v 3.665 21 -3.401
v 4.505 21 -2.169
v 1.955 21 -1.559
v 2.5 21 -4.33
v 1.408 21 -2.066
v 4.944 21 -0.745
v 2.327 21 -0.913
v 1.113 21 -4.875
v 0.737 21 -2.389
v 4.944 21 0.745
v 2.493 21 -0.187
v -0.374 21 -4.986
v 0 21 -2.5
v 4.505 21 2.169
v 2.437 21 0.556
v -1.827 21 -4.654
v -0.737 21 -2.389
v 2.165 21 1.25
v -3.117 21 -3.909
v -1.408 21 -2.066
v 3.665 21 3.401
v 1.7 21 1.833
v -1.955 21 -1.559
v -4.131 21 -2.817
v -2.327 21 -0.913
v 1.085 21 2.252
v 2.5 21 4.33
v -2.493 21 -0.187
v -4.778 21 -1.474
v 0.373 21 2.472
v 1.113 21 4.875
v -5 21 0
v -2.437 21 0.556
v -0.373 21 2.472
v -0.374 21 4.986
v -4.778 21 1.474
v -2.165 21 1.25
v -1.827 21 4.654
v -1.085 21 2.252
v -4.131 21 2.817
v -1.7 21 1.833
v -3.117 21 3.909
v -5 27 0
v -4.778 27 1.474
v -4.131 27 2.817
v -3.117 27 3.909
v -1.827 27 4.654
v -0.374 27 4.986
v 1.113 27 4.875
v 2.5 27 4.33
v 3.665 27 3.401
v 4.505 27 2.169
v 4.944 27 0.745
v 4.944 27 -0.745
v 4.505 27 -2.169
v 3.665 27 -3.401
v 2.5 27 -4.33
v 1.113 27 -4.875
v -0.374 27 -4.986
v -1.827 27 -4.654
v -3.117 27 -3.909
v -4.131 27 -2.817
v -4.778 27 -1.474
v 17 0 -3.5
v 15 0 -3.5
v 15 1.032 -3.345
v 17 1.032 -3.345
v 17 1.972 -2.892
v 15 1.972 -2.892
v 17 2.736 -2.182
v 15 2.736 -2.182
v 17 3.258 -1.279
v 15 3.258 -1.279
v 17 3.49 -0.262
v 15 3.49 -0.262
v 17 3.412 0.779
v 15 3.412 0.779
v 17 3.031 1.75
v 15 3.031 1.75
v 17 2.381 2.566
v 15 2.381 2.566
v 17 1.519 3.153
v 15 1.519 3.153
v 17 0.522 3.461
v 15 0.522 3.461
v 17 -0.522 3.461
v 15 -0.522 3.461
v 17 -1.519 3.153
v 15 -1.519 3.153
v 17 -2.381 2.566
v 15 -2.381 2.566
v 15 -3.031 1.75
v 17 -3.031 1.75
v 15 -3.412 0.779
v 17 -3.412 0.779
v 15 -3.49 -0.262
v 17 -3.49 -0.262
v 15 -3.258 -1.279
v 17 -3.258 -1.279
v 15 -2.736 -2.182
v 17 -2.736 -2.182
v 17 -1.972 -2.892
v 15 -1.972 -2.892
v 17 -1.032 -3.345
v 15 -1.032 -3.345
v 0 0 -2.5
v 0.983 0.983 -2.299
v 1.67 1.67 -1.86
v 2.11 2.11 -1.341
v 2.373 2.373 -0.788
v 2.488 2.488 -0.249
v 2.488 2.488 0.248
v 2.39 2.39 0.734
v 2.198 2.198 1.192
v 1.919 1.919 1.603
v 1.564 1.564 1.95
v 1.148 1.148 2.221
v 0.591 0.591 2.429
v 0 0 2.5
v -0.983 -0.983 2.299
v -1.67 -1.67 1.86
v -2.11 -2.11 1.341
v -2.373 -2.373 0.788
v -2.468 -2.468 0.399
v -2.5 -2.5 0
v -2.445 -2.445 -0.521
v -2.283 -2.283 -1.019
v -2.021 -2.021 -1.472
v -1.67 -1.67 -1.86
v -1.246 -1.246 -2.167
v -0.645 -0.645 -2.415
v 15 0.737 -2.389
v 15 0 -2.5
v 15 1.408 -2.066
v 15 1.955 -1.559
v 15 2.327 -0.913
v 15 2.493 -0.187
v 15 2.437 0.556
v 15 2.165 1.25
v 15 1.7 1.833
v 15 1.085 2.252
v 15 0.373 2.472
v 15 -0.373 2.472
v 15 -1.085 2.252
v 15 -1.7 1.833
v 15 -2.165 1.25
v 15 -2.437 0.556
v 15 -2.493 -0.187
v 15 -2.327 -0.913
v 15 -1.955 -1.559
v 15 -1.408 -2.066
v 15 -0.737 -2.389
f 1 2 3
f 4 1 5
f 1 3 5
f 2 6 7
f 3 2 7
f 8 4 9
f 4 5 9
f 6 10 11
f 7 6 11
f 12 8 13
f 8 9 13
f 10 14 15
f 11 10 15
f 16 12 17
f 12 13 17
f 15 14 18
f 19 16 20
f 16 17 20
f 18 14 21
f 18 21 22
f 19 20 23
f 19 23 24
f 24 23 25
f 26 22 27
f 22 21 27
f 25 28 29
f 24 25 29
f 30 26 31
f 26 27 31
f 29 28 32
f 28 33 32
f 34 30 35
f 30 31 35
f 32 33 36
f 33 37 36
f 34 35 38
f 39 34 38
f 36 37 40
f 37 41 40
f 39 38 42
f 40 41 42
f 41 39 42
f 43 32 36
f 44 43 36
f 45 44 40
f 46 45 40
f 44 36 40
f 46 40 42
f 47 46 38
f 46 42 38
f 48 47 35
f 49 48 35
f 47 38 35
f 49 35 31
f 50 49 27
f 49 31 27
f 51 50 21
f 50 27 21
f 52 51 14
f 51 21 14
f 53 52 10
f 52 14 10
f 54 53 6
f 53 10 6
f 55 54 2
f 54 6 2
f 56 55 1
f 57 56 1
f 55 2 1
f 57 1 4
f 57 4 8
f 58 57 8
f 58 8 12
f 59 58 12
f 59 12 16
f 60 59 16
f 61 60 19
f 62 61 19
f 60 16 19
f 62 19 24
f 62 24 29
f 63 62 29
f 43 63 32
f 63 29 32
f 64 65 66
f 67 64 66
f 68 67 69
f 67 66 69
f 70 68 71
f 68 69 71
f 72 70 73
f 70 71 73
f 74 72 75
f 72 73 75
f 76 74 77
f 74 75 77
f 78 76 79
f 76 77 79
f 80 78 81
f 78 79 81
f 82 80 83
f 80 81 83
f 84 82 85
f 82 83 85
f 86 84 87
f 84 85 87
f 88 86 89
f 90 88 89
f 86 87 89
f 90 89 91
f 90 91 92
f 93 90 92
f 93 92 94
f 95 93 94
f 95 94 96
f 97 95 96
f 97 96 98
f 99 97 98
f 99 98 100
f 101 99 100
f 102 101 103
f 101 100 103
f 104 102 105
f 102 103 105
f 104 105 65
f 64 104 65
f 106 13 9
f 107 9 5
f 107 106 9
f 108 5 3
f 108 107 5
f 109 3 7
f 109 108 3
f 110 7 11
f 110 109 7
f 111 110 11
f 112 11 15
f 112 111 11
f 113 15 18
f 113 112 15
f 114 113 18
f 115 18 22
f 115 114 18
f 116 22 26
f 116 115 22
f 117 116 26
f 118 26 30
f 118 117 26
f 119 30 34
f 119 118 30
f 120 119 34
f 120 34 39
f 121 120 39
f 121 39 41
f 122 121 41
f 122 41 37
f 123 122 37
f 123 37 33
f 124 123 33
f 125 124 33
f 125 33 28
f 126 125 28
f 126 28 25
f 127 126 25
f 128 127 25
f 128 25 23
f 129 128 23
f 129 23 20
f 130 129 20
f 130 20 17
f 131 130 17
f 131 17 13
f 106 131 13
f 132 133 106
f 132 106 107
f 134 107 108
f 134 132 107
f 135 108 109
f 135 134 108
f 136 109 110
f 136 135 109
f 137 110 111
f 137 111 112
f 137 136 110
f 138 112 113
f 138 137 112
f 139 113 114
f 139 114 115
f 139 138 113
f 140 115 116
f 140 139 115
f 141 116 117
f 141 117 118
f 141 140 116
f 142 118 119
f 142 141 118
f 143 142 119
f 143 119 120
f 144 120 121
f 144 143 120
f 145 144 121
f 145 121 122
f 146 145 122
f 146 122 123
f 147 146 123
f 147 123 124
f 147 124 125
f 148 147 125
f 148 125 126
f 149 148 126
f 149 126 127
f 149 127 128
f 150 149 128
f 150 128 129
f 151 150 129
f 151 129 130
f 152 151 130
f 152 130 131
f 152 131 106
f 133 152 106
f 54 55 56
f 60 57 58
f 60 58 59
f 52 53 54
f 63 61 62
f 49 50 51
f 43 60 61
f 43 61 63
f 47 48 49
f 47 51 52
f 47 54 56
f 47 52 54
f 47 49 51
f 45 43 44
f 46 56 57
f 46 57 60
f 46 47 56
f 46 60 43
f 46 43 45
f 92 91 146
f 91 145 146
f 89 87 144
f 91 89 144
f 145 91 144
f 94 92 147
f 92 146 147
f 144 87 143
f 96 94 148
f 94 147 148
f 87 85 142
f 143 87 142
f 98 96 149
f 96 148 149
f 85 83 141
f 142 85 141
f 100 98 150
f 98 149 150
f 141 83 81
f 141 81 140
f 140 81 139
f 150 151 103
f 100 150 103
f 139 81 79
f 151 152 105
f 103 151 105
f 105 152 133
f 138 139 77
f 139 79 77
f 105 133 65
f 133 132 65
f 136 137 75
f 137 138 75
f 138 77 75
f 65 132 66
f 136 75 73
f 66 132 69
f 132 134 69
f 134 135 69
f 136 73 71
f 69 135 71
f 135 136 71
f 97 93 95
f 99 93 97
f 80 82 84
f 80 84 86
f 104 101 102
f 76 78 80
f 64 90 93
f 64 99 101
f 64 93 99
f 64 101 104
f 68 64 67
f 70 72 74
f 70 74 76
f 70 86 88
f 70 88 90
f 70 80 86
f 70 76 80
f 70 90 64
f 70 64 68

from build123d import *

# Parameters (mm, degrees)
SKETCH2_R           = 2.5
SKETCH3_R           = 3.5
BOSS_EXTRUDE1_DEPTH = 2
SKETCH4_R           = 5
BOSS_EXTRUDE2_DEPTH = 6


with BuildPart() as part:
    # Sweep1: sweep along a path in Sketch1
    with BuildLine(Plane.XY) as sweep1_path:
        Line((0, 21), (0, 0))
        Line((0, 0), (15, 0))
    # Sketch2 → Sweep1 (sweep)
    with BuildSketch(Plane(origin=(15, 0, 0), x_dir=(0, 0, -1), z_dir=(1, 0, 0))):
        Circle(SKETCH2_R)
    sweep(path=sweep1_path.line, transition=Transition.RIGHT)

    # Sketch3 → Boss-Extrude1 (add)
    with BuildSketch(Plane(origin=(15, 0, 0), x_dir=(0, 0, -1), z_dir=(1, 0, 0))):
        Circle(SKETCH3_R)
    extrude(amount=BOSS_EXTRUDE1_DEPTH)

    # Sketch4 → Boss-Extrude2 (add)
    with BuildSketch(Plane(origin=(0, 21, 0), x_dir=(1, 0, 0), z_dir=(0, 1, 0))):
        with Locations(Location((0, 0, 0), (0, 0, 180))):
            Circle(SKETCH4_R)
    extrude(amount=BOSS_EXTRUDE2_DEPTH)


solid = part.part
